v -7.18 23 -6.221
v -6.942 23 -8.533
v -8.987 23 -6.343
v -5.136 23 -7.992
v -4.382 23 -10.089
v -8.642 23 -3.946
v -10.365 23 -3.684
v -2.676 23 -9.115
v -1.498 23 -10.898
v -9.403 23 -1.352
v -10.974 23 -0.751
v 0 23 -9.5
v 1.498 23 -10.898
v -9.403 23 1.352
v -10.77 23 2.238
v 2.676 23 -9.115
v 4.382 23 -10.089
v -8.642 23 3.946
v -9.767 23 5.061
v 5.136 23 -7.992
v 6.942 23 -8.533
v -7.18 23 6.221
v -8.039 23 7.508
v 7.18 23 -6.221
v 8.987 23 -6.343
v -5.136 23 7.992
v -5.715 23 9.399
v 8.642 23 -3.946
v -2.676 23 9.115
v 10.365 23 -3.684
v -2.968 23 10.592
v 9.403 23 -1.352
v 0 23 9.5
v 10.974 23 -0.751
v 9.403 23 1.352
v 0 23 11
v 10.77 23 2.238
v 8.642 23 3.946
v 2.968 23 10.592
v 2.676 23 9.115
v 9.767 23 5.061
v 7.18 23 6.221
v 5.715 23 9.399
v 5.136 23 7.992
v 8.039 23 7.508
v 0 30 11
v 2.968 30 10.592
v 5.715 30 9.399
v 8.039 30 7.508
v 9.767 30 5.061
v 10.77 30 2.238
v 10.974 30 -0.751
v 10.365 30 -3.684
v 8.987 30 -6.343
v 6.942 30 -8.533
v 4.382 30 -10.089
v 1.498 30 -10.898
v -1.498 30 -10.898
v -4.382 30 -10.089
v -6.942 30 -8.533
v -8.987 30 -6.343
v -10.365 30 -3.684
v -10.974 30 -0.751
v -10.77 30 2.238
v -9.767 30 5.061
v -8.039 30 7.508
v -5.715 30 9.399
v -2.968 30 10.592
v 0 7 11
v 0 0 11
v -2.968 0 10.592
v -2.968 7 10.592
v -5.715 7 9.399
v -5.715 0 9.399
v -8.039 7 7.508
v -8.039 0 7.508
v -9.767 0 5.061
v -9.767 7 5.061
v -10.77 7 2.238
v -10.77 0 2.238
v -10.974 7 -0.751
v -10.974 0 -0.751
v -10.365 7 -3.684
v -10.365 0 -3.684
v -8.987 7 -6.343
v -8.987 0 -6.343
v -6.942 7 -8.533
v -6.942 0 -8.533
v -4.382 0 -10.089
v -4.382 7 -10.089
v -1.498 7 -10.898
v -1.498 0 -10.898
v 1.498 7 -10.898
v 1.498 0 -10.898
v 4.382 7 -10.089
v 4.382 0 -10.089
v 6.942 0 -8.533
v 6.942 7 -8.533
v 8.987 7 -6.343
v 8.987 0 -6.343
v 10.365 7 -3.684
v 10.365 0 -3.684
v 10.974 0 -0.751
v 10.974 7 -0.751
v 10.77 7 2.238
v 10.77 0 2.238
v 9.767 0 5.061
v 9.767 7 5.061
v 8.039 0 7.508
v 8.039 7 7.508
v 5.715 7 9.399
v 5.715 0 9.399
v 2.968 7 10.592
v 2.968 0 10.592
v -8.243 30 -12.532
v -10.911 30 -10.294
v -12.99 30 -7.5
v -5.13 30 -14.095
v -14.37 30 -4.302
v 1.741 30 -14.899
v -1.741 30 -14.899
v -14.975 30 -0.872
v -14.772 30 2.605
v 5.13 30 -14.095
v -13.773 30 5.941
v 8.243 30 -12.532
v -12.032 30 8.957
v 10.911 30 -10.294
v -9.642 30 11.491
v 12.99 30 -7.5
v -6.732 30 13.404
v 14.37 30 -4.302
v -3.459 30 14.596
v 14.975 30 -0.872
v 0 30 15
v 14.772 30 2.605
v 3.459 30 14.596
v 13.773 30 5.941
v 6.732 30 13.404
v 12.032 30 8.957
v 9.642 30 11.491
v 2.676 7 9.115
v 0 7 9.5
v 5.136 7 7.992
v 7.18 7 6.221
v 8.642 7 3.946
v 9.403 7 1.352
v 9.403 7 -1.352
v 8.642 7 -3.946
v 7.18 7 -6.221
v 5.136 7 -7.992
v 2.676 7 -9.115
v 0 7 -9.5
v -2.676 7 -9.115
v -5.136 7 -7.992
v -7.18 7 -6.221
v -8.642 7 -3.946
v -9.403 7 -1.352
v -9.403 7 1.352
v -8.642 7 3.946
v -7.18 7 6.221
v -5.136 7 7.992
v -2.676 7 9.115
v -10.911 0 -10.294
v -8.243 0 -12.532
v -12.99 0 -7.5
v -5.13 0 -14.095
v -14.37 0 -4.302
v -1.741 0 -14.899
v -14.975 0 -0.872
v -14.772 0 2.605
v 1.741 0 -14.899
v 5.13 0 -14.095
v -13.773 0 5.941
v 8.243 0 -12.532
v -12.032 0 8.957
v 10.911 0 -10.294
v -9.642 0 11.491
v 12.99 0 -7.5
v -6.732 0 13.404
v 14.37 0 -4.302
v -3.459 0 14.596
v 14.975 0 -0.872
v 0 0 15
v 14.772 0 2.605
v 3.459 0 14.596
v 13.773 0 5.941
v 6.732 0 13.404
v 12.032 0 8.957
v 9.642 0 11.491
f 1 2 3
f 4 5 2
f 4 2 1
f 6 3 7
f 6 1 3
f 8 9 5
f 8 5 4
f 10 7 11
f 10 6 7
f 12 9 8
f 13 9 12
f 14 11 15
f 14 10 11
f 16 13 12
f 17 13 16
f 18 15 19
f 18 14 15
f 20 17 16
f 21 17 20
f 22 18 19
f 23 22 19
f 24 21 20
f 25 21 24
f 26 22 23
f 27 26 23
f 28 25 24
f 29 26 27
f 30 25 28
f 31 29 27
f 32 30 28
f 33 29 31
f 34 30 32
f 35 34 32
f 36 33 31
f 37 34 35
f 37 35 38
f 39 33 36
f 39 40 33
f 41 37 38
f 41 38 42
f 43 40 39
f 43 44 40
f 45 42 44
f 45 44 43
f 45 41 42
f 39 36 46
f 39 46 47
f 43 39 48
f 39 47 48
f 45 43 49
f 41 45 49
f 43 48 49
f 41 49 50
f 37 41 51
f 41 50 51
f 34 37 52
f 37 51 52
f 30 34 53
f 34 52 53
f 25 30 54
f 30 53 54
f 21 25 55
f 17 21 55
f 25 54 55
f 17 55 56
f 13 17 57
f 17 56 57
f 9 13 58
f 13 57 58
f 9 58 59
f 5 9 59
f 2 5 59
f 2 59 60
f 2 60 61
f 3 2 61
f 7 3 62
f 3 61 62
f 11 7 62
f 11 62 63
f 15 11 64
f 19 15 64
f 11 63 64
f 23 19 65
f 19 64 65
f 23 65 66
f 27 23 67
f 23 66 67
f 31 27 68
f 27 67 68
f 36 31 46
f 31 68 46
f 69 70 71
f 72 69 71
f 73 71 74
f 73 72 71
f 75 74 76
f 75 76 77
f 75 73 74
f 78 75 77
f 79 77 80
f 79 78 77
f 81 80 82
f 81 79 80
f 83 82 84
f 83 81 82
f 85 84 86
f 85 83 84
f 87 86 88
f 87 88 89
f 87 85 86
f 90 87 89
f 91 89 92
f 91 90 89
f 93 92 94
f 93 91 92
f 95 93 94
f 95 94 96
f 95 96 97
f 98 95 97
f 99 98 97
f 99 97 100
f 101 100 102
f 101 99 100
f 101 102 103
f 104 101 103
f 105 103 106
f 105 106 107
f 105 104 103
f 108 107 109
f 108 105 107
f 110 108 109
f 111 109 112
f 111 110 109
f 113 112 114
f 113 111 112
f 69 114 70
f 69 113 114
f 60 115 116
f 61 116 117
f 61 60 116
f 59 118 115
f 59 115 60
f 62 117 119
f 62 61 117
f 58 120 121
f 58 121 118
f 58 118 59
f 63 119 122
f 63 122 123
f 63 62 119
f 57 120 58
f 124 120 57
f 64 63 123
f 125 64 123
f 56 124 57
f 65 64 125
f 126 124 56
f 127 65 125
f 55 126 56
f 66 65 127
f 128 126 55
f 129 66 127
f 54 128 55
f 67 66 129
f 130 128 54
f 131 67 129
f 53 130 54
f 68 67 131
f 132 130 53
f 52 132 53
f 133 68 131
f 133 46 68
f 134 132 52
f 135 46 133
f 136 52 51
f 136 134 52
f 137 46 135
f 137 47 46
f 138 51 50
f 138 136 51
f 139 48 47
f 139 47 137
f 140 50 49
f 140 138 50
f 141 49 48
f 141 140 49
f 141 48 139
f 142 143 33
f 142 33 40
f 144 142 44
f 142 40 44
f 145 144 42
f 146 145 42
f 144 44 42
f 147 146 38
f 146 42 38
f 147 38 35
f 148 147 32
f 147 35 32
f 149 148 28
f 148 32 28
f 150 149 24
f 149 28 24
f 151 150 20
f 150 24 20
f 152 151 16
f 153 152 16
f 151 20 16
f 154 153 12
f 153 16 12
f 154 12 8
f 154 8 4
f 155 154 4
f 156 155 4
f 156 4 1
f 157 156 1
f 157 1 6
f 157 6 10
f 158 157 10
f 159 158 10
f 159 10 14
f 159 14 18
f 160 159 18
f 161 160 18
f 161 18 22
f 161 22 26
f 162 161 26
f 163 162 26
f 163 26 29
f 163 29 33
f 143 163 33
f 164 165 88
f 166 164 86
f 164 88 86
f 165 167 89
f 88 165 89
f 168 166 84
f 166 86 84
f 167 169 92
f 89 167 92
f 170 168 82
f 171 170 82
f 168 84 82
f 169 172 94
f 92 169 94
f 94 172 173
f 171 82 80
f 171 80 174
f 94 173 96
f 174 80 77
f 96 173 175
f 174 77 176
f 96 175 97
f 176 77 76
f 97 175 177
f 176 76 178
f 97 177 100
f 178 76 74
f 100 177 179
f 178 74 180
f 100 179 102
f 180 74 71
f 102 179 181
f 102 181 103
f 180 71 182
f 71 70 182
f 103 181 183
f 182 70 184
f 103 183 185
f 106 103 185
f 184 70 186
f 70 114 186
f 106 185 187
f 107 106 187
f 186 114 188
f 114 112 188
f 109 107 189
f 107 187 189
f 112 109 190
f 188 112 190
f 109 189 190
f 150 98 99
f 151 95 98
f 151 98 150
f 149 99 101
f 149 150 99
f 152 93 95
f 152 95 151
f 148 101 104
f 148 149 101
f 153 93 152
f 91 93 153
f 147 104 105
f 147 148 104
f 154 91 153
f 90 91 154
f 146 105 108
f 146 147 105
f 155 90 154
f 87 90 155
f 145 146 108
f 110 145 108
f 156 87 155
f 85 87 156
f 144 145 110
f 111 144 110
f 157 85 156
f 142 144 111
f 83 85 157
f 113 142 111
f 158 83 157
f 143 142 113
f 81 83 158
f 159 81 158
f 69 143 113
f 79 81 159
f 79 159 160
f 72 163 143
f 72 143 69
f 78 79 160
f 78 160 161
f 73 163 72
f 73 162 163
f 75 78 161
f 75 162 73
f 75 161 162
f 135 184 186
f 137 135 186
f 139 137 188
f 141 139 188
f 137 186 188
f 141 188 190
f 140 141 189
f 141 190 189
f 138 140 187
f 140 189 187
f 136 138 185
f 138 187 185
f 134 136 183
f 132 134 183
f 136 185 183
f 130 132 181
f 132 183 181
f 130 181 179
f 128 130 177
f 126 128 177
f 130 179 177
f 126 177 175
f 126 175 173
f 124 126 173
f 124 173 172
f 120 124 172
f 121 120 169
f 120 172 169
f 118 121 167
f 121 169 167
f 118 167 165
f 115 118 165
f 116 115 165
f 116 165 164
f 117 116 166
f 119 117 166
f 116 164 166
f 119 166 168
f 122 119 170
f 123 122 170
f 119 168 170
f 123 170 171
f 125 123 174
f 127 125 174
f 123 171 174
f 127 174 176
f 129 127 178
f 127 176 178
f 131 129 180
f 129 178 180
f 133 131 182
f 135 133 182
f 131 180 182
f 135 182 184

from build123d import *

# Parameters (mm, degrees)
CROQUIS2_R              = 15
SALIENTE_EXTRUIR2_DEPTH = 30
CROQUIS3_R              = 11
CORTAR_EXTRUIR1_DEPTH   = 7
CORTAR_EXTRUIR2_START   = -7
CROQUIS4_R              = 11
CORTAR_EXTRUIR2_DEPTH   = 7
CORTAR_EXTRUIR3_REACH   = 33.289
CROQUIS5_R              = 9.5


with BuildPart() as part:
    # Croquis2 → Saliente-Extruir2 (new body)
    with BuildSketch(Plane(origin=(0, 0, 0), x_dir=(1, 0, 0), z_dir=(0, 1, 0))):
        with Locations(Location((0, 0, 0), (0, 0, 270))):
            Circle(CROQUIS2_R)
    extrude(amount=SALIENTE_EXTRUIR2_DEPTH)

    # Croquis3 → Cortar-Extruir1 (cut)
    with BuildSketch(Plane(origin=(0, 30, 0), x_dir=(1, 0, 0), z_dir=(0, 1, 0))):
        with Locations(Location((0, 0, 0), (0, 0, 270))):
            Circle(CROQUIS3_R)
    extrude(amount=-CORTAR_EXTRUIR1_DEPTH, mode=Mode.SUBTRACT)

    # Croquis4 → Cortar-Extruir2 (cut)
    with BuildSketch(Plane(origin=(0, 0, 0), x_dir=(-1, 0, 0), z_dir=(0, -1, 0)).offset(CORTAR_EXTRUIR2_START)):
        with Locations(Location((0, 0, 0), (0, 0, 270))):
            Circle(CROQUIS4_R)
    extrude(amount=CORTAR_EXTRUIR2_DEPTH, mode=Mode.SUBTRACT)

    # Croquis5 → Cortar-Extruir3 (cut, up to next)
    with BuildSketch(Plane(origin=(0, 23, 0), x_dir=(1, 0, 0), z_dir=(0, 1, 0)), mode=Mode.PRIVATE) as cortar_extruir3_sk1:
        with Locations(Location((0, 0, 0), (0, 0, 270))):
            Circle(CROQUIS5_R)
    cortar_extruir3_tool1 = extrude(cortar_extruir3_sk1.sketch, amount=-CORTAR_EXTRUIR3_REACH, mode=Mode.PRIVATE) & part.part
    add(cortar_extruir3_tool1.solids().sort_by_distance((0, 23, 0))[0], mode=Mode.SUBTRACT)


solid = part.part
